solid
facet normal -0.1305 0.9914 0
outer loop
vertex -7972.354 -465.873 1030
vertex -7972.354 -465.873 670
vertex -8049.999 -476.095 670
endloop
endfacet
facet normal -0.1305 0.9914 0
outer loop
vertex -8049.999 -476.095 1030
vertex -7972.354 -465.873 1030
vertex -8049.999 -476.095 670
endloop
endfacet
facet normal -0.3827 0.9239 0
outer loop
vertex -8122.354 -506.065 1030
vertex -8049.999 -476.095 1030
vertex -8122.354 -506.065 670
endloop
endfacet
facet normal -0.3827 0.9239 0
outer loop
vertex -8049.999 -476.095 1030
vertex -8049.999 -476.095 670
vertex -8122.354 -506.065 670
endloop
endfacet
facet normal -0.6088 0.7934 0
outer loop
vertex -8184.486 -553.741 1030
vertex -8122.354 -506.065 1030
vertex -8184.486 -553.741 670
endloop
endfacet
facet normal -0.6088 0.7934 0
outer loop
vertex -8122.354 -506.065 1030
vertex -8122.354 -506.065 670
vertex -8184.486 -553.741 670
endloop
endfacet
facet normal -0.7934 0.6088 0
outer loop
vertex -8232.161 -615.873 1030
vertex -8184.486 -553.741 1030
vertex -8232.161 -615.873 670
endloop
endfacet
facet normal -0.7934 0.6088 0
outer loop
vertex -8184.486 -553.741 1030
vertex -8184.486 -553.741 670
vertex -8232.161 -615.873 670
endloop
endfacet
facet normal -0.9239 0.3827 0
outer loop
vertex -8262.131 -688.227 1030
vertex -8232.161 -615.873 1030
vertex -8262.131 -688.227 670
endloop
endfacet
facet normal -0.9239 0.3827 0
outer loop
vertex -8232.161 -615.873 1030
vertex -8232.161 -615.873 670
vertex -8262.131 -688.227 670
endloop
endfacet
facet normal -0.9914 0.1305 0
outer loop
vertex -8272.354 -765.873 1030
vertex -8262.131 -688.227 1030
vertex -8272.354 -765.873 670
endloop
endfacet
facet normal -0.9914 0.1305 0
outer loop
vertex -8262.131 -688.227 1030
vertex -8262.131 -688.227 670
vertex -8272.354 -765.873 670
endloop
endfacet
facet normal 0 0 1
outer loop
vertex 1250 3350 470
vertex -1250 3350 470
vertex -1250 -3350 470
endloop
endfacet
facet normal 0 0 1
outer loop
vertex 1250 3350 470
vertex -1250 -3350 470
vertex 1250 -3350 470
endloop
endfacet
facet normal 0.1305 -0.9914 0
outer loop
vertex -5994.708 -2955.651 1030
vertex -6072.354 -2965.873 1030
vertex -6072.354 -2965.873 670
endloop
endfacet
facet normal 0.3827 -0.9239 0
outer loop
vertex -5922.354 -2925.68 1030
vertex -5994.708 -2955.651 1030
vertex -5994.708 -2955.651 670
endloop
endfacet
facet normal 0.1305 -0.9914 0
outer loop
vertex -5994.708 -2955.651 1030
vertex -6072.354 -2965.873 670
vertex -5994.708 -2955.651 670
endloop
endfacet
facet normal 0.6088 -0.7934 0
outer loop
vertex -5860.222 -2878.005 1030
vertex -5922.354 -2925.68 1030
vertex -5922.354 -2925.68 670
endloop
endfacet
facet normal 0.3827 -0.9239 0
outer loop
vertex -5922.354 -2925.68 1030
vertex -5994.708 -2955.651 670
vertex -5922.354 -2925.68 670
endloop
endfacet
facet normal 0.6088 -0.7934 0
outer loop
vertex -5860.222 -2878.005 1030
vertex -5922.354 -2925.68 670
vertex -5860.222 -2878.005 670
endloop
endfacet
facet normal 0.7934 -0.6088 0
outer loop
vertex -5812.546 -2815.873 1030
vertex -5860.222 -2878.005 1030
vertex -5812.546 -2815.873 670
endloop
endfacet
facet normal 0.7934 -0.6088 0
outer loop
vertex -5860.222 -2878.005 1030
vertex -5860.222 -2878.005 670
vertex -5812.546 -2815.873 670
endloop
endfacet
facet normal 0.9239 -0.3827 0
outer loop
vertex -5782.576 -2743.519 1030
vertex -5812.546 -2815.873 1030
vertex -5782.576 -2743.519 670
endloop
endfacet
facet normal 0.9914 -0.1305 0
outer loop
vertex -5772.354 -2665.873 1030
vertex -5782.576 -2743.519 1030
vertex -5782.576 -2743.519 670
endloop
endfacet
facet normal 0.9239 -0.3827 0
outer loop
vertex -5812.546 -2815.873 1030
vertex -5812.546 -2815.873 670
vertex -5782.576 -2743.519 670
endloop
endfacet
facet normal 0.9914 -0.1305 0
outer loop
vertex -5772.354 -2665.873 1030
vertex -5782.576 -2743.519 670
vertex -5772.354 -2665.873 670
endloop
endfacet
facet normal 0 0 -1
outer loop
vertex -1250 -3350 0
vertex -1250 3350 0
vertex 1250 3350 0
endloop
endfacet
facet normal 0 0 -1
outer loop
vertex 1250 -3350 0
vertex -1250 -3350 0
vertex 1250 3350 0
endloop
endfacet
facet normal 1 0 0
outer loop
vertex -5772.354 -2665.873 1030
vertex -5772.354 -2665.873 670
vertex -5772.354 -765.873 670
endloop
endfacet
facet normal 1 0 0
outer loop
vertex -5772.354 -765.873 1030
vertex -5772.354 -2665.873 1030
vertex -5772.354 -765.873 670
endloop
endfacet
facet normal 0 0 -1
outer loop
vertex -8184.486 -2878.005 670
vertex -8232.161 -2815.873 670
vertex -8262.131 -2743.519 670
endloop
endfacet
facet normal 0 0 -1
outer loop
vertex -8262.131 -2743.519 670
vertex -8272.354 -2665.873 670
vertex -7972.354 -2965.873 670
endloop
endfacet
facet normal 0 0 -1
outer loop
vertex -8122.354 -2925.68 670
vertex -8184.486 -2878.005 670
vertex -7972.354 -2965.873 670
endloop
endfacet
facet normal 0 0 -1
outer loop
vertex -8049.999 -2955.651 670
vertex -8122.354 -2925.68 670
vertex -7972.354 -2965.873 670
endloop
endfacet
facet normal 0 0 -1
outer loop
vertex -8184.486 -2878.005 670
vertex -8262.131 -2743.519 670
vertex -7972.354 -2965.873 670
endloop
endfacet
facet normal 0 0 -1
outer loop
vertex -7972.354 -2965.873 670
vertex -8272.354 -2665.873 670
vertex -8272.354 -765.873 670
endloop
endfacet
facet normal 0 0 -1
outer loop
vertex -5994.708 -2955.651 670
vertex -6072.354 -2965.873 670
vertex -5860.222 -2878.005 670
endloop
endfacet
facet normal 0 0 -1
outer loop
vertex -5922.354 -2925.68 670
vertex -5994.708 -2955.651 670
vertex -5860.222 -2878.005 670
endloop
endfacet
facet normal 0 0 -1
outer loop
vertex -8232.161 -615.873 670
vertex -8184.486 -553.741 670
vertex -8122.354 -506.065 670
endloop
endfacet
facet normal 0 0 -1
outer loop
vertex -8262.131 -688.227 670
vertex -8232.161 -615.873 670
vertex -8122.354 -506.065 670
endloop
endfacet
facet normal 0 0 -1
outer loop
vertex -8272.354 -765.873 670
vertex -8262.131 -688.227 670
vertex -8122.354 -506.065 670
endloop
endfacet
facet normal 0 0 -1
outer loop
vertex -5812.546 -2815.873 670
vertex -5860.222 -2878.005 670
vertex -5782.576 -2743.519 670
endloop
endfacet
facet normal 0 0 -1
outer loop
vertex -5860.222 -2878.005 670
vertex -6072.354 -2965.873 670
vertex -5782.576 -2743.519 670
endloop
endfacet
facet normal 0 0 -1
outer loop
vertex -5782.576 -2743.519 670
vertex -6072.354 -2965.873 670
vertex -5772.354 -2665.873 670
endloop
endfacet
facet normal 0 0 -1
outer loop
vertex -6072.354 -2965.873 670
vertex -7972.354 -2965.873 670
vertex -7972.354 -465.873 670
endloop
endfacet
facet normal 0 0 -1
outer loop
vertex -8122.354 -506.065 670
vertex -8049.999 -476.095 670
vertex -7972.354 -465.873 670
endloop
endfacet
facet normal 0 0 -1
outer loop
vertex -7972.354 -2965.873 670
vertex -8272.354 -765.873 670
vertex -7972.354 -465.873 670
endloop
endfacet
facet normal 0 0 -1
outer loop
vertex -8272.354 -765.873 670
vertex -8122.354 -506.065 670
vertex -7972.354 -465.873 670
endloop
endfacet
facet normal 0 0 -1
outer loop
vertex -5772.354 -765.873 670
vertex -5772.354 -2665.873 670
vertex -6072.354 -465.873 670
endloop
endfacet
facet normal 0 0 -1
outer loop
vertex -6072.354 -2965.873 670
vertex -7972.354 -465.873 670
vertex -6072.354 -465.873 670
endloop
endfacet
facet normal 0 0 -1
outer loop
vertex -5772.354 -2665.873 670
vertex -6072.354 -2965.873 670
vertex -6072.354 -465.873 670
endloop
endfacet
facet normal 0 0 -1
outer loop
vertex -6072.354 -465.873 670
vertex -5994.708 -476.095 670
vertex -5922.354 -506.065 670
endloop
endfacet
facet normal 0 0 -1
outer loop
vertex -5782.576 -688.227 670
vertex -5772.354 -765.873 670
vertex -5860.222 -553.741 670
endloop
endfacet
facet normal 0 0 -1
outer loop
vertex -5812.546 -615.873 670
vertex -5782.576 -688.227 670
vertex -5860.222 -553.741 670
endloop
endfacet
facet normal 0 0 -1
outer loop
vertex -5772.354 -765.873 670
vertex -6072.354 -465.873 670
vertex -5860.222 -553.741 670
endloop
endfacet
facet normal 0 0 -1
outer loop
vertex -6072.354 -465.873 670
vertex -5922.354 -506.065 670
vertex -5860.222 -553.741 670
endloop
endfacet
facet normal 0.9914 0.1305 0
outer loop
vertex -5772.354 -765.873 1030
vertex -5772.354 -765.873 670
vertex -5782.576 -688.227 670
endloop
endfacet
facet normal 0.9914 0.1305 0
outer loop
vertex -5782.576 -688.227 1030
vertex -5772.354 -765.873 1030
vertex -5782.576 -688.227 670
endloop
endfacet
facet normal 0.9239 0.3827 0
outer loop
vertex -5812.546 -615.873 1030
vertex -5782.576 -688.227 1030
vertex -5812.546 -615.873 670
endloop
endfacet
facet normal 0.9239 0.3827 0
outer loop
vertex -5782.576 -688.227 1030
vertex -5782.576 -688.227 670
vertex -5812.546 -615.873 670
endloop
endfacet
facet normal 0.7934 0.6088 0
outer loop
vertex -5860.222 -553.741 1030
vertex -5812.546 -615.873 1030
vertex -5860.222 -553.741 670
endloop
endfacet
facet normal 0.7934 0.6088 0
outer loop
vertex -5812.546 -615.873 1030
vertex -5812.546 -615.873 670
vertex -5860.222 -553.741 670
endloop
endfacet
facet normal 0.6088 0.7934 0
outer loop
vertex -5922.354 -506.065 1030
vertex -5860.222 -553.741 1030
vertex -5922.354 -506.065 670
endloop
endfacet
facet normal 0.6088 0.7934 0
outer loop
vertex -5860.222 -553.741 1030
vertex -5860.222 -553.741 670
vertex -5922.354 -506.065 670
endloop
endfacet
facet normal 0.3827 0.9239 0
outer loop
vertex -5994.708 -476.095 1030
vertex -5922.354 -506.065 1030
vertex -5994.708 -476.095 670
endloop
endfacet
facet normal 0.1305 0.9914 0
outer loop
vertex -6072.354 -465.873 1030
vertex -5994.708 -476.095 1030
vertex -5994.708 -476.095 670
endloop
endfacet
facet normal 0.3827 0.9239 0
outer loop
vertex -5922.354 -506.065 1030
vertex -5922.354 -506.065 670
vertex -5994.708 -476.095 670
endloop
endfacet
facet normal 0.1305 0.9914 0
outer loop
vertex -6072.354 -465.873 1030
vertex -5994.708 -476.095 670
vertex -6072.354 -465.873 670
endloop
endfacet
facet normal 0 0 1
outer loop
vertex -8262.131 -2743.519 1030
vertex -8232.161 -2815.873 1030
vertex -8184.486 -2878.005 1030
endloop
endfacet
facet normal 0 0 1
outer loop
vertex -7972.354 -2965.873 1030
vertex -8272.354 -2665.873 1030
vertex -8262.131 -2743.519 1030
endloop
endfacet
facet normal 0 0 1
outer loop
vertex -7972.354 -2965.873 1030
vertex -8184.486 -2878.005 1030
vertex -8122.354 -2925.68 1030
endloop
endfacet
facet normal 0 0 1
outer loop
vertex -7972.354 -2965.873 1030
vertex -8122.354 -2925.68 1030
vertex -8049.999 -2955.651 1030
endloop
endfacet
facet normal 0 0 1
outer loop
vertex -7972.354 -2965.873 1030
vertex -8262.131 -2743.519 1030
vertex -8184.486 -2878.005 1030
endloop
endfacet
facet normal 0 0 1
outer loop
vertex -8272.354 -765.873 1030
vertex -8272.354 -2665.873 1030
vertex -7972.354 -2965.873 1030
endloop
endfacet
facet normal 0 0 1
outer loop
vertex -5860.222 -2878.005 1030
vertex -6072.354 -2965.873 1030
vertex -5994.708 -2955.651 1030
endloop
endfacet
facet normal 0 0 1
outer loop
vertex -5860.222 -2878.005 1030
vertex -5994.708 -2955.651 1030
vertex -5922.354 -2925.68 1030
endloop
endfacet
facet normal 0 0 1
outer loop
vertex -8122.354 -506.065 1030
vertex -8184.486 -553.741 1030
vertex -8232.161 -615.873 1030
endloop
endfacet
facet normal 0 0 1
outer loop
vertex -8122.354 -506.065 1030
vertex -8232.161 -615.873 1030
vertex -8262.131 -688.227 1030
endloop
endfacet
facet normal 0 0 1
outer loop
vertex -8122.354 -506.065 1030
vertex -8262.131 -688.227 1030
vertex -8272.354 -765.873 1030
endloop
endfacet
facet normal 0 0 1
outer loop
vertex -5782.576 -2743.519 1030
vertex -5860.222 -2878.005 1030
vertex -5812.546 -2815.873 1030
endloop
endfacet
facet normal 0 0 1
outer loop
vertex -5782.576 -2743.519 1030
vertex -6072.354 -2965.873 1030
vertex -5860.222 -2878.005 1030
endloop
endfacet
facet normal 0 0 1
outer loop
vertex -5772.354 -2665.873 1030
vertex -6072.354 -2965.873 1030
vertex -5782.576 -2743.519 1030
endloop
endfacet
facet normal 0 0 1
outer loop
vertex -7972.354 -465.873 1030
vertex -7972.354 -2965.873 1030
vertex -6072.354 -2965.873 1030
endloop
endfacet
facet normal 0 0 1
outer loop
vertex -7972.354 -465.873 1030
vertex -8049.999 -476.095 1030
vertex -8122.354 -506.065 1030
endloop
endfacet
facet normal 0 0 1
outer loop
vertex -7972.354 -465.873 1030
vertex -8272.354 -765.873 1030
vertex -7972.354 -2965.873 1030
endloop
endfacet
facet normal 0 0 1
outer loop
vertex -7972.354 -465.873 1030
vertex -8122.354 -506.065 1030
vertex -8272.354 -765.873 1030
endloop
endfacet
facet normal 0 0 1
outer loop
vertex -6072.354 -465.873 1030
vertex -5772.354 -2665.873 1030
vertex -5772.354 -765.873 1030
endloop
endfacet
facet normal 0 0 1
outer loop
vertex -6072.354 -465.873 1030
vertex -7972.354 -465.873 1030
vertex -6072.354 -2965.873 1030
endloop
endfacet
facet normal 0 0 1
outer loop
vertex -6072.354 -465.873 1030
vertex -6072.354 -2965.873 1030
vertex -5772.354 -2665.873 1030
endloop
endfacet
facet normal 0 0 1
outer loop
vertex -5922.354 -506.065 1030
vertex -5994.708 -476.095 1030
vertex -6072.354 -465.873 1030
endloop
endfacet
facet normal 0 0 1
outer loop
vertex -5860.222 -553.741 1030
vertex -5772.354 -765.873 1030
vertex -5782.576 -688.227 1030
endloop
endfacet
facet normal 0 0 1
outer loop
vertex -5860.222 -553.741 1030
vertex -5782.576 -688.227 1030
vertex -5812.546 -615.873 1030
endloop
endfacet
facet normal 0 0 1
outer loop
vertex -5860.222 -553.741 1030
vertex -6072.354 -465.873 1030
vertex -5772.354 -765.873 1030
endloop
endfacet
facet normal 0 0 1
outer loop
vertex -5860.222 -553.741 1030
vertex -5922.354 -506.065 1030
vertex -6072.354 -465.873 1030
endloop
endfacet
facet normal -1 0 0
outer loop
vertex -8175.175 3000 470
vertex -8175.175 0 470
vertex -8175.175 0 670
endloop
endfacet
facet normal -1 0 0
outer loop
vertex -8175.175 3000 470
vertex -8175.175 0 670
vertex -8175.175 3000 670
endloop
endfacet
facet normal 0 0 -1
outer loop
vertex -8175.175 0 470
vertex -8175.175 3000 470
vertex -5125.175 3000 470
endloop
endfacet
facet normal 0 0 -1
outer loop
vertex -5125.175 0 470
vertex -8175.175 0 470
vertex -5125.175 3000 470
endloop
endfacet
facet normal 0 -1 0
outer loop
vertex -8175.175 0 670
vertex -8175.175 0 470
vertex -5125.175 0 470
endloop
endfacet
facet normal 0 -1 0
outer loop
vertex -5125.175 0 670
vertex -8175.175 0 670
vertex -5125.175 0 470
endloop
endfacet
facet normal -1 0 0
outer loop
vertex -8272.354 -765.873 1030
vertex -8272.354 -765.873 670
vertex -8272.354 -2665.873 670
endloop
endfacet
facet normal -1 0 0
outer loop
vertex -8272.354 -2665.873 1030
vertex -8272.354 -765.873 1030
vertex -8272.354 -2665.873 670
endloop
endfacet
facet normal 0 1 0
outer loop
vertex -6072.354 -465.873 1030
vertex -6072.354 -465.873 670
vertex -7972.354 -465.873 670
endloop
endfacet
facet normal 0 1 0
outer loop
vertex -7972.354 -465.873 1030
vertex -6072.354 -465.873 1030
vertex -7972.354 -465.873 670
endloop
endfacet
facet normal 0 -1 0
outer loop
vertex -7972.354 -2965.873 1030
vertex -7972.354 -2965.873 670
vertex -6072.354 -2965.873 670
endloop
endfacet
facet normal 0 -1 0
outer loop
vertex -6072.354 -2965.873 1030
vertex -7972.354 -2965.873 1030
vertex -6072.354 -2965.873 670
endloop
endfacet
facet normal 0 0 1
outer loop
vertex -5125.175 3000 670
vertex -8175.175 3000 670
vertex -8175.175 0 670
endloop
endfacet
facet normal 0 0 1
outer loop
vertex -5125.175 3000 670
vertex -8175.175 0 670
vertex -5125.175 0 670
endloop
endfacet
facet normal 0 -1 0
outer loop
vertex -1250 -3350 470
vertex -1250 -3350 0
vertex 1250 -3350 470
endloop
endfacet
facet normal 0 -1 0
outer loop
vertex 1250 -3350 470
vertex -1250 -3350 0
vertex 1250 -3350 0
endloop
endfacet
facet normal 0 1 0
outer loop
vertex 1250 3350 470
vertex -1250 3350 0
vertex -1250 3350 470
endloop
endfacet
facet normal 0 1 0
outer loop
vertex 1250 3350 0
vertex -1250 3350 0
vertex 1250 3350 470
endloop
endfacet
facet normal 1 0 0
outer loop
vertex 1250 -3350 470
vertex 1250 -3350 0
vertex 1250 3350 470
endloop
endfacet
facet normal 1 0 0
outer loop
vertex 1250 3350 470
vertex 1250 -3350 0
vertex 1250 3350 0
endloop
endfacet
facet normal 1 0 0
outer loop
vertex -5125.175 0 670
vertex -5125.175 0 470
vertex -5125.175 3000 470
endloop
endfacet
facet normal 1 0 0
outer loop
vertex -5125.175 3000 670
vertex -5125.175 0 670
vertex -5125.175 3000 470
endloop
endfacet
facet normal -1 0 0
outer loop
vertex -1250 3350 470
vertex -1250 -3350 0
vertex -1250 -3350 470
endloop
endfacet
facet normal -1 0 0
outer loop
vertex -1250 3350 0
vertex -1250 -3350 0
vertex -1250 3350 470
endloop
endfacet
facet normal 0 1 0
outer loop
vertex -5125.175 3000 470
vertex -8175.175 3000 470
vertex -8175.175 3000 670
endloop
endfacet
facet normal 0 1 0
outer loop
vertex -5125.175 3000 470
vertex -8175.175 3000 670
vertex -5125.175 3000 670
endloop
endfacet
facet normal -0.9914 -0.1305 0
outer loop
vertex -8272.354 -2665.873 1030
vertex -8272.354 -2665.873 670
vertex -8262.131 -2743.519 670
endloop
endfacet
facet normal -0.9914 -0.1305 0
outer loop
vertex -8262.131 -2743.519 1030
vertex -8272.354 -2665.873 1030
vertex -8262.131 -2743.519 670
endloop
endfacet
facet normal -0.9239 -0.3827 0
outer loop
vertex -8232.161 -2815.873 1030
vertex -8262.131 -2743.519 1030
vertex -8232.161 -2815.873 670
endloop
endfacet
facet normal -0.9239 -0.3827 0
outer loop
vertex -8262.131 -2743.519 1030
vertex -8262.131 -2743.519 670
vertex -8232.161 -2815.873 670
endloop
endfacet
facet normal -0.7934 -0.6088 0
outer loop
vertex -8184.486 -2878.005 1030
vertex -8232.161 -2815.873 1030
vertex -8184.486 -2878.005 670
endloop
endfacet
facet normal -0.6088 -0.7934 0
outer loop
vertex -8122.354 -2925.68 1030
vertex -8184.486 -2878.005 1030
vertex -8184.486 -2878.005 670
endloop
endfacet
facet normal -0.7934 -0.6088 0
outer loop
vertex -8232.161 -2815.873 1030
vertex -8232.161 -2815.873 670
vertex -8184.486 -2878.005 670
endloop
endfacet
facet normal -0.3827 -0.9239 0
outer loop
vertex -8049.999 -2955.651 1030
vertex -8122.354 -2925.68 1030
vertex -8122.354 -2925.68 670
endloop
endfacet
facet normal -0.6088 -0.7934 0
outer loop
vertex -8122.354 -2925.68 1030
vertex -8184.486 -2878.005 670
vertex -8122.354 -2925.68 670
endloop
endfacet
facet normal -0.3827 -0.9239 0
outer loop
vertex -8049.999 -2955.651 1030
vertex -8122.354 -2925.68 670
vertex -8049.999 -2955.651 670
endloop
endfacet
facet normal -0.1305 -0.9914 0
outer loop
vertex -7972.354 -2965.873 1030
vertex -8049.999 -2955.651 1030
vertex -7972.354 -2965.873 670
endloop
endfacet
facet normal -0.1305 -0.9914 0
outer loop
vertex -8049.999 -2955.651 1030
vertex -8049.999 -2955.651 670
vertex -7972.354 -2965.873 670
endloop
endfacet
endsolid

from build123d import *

# Parameters (mm, degrees)
F0_W     = 2500
F0_H     = 6700
F1_DEPTH = 470
F2_W     = 3050
F2_H     = 3000
F3_DEPTH = 200
F5_DEPTH = 360


with BuildPart() as f1:
    # F0 (on Top) → F1 (new body)
    with BuildSketch(Plane.XY):
        Rectangle(F0_W, F0_H)
    extrude(amount=F1_DEPTH)


with BuildPart() as f3:
    # F2 (on face) → F3 (new body)
    with BuildSketch(Plane.XY.offset(470)):
        with Locations((-6650.174713, 1500)):
            Rectangle(F2_W, F2_H)
    extrude(amount=F3_DEPTH)


with BuildPart() as f5:
    # F4 (on face) → F5 (new body)
    with BuildSketch(Plane.XY.offset(670)):
        with BuildLine():
            Line((-7972.353649, -2965.872793), (-6072.353649, -2965.872793))
            ThreePointArc((-6072.353649, -2965.872793), (-5860.221615, -2878.004828), (-5772.353649, -2665.872793))
            Line((-5772.353649, -2665.872793), (-5772.353649, -765.872793))
            ThreePointArc((-5772.353649, -765.872793), (-5860.221615, -553.740759), (-6072.353649, -465.872793))
            Line((-6072.353649, -465.872793), (-7972.353649, -465.872793))
            ThreePointArc((-7972.353649, -465.872793), (-8184.485683, -553.740759), (-8272.353649, -765.872793))
            Line((-8272.353649, -765.872793), (-8272.353649, -2665.872793))
            ThreePointArc((-8272.353649, -2665.872793), (-8184.485683, -2878.004828), (-7972.353649, -2965.872793))
        make_face()
    extrude(amount=F5_DEPTH)


solid = Compound([f1.part, f3.part, f5.part])
